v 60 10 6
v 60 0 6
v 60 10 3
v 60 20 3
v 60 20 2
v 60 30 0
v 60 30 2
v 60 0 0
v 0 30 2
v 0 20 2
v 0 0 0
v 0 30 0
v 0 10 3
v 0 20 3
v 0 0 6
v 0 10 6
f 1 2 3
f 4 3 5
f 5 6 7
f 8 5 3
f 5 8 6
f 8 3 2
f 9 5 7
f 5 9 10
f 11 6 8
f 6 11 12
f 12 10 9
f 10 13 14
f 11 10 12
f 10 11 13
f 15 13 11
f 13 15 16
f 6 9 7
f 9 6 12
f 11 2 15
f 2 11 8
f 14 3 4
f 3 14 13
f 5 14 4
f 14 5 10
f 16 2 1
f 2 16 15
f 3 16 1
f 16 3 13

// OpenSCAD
overlap = 0.1;
matteDepth = 2;
screenDepth = 1;
frameDepth = 3;
cube([60,30,matteDepth]);
translate([0,0,matteDepth - overlap])
  cube([60,20, screenDepth + overlap]);
  
translate([0,0,screenDepth + matteDepth  - overlap])
  cube([60,10, frameDepth + overlap]);  
